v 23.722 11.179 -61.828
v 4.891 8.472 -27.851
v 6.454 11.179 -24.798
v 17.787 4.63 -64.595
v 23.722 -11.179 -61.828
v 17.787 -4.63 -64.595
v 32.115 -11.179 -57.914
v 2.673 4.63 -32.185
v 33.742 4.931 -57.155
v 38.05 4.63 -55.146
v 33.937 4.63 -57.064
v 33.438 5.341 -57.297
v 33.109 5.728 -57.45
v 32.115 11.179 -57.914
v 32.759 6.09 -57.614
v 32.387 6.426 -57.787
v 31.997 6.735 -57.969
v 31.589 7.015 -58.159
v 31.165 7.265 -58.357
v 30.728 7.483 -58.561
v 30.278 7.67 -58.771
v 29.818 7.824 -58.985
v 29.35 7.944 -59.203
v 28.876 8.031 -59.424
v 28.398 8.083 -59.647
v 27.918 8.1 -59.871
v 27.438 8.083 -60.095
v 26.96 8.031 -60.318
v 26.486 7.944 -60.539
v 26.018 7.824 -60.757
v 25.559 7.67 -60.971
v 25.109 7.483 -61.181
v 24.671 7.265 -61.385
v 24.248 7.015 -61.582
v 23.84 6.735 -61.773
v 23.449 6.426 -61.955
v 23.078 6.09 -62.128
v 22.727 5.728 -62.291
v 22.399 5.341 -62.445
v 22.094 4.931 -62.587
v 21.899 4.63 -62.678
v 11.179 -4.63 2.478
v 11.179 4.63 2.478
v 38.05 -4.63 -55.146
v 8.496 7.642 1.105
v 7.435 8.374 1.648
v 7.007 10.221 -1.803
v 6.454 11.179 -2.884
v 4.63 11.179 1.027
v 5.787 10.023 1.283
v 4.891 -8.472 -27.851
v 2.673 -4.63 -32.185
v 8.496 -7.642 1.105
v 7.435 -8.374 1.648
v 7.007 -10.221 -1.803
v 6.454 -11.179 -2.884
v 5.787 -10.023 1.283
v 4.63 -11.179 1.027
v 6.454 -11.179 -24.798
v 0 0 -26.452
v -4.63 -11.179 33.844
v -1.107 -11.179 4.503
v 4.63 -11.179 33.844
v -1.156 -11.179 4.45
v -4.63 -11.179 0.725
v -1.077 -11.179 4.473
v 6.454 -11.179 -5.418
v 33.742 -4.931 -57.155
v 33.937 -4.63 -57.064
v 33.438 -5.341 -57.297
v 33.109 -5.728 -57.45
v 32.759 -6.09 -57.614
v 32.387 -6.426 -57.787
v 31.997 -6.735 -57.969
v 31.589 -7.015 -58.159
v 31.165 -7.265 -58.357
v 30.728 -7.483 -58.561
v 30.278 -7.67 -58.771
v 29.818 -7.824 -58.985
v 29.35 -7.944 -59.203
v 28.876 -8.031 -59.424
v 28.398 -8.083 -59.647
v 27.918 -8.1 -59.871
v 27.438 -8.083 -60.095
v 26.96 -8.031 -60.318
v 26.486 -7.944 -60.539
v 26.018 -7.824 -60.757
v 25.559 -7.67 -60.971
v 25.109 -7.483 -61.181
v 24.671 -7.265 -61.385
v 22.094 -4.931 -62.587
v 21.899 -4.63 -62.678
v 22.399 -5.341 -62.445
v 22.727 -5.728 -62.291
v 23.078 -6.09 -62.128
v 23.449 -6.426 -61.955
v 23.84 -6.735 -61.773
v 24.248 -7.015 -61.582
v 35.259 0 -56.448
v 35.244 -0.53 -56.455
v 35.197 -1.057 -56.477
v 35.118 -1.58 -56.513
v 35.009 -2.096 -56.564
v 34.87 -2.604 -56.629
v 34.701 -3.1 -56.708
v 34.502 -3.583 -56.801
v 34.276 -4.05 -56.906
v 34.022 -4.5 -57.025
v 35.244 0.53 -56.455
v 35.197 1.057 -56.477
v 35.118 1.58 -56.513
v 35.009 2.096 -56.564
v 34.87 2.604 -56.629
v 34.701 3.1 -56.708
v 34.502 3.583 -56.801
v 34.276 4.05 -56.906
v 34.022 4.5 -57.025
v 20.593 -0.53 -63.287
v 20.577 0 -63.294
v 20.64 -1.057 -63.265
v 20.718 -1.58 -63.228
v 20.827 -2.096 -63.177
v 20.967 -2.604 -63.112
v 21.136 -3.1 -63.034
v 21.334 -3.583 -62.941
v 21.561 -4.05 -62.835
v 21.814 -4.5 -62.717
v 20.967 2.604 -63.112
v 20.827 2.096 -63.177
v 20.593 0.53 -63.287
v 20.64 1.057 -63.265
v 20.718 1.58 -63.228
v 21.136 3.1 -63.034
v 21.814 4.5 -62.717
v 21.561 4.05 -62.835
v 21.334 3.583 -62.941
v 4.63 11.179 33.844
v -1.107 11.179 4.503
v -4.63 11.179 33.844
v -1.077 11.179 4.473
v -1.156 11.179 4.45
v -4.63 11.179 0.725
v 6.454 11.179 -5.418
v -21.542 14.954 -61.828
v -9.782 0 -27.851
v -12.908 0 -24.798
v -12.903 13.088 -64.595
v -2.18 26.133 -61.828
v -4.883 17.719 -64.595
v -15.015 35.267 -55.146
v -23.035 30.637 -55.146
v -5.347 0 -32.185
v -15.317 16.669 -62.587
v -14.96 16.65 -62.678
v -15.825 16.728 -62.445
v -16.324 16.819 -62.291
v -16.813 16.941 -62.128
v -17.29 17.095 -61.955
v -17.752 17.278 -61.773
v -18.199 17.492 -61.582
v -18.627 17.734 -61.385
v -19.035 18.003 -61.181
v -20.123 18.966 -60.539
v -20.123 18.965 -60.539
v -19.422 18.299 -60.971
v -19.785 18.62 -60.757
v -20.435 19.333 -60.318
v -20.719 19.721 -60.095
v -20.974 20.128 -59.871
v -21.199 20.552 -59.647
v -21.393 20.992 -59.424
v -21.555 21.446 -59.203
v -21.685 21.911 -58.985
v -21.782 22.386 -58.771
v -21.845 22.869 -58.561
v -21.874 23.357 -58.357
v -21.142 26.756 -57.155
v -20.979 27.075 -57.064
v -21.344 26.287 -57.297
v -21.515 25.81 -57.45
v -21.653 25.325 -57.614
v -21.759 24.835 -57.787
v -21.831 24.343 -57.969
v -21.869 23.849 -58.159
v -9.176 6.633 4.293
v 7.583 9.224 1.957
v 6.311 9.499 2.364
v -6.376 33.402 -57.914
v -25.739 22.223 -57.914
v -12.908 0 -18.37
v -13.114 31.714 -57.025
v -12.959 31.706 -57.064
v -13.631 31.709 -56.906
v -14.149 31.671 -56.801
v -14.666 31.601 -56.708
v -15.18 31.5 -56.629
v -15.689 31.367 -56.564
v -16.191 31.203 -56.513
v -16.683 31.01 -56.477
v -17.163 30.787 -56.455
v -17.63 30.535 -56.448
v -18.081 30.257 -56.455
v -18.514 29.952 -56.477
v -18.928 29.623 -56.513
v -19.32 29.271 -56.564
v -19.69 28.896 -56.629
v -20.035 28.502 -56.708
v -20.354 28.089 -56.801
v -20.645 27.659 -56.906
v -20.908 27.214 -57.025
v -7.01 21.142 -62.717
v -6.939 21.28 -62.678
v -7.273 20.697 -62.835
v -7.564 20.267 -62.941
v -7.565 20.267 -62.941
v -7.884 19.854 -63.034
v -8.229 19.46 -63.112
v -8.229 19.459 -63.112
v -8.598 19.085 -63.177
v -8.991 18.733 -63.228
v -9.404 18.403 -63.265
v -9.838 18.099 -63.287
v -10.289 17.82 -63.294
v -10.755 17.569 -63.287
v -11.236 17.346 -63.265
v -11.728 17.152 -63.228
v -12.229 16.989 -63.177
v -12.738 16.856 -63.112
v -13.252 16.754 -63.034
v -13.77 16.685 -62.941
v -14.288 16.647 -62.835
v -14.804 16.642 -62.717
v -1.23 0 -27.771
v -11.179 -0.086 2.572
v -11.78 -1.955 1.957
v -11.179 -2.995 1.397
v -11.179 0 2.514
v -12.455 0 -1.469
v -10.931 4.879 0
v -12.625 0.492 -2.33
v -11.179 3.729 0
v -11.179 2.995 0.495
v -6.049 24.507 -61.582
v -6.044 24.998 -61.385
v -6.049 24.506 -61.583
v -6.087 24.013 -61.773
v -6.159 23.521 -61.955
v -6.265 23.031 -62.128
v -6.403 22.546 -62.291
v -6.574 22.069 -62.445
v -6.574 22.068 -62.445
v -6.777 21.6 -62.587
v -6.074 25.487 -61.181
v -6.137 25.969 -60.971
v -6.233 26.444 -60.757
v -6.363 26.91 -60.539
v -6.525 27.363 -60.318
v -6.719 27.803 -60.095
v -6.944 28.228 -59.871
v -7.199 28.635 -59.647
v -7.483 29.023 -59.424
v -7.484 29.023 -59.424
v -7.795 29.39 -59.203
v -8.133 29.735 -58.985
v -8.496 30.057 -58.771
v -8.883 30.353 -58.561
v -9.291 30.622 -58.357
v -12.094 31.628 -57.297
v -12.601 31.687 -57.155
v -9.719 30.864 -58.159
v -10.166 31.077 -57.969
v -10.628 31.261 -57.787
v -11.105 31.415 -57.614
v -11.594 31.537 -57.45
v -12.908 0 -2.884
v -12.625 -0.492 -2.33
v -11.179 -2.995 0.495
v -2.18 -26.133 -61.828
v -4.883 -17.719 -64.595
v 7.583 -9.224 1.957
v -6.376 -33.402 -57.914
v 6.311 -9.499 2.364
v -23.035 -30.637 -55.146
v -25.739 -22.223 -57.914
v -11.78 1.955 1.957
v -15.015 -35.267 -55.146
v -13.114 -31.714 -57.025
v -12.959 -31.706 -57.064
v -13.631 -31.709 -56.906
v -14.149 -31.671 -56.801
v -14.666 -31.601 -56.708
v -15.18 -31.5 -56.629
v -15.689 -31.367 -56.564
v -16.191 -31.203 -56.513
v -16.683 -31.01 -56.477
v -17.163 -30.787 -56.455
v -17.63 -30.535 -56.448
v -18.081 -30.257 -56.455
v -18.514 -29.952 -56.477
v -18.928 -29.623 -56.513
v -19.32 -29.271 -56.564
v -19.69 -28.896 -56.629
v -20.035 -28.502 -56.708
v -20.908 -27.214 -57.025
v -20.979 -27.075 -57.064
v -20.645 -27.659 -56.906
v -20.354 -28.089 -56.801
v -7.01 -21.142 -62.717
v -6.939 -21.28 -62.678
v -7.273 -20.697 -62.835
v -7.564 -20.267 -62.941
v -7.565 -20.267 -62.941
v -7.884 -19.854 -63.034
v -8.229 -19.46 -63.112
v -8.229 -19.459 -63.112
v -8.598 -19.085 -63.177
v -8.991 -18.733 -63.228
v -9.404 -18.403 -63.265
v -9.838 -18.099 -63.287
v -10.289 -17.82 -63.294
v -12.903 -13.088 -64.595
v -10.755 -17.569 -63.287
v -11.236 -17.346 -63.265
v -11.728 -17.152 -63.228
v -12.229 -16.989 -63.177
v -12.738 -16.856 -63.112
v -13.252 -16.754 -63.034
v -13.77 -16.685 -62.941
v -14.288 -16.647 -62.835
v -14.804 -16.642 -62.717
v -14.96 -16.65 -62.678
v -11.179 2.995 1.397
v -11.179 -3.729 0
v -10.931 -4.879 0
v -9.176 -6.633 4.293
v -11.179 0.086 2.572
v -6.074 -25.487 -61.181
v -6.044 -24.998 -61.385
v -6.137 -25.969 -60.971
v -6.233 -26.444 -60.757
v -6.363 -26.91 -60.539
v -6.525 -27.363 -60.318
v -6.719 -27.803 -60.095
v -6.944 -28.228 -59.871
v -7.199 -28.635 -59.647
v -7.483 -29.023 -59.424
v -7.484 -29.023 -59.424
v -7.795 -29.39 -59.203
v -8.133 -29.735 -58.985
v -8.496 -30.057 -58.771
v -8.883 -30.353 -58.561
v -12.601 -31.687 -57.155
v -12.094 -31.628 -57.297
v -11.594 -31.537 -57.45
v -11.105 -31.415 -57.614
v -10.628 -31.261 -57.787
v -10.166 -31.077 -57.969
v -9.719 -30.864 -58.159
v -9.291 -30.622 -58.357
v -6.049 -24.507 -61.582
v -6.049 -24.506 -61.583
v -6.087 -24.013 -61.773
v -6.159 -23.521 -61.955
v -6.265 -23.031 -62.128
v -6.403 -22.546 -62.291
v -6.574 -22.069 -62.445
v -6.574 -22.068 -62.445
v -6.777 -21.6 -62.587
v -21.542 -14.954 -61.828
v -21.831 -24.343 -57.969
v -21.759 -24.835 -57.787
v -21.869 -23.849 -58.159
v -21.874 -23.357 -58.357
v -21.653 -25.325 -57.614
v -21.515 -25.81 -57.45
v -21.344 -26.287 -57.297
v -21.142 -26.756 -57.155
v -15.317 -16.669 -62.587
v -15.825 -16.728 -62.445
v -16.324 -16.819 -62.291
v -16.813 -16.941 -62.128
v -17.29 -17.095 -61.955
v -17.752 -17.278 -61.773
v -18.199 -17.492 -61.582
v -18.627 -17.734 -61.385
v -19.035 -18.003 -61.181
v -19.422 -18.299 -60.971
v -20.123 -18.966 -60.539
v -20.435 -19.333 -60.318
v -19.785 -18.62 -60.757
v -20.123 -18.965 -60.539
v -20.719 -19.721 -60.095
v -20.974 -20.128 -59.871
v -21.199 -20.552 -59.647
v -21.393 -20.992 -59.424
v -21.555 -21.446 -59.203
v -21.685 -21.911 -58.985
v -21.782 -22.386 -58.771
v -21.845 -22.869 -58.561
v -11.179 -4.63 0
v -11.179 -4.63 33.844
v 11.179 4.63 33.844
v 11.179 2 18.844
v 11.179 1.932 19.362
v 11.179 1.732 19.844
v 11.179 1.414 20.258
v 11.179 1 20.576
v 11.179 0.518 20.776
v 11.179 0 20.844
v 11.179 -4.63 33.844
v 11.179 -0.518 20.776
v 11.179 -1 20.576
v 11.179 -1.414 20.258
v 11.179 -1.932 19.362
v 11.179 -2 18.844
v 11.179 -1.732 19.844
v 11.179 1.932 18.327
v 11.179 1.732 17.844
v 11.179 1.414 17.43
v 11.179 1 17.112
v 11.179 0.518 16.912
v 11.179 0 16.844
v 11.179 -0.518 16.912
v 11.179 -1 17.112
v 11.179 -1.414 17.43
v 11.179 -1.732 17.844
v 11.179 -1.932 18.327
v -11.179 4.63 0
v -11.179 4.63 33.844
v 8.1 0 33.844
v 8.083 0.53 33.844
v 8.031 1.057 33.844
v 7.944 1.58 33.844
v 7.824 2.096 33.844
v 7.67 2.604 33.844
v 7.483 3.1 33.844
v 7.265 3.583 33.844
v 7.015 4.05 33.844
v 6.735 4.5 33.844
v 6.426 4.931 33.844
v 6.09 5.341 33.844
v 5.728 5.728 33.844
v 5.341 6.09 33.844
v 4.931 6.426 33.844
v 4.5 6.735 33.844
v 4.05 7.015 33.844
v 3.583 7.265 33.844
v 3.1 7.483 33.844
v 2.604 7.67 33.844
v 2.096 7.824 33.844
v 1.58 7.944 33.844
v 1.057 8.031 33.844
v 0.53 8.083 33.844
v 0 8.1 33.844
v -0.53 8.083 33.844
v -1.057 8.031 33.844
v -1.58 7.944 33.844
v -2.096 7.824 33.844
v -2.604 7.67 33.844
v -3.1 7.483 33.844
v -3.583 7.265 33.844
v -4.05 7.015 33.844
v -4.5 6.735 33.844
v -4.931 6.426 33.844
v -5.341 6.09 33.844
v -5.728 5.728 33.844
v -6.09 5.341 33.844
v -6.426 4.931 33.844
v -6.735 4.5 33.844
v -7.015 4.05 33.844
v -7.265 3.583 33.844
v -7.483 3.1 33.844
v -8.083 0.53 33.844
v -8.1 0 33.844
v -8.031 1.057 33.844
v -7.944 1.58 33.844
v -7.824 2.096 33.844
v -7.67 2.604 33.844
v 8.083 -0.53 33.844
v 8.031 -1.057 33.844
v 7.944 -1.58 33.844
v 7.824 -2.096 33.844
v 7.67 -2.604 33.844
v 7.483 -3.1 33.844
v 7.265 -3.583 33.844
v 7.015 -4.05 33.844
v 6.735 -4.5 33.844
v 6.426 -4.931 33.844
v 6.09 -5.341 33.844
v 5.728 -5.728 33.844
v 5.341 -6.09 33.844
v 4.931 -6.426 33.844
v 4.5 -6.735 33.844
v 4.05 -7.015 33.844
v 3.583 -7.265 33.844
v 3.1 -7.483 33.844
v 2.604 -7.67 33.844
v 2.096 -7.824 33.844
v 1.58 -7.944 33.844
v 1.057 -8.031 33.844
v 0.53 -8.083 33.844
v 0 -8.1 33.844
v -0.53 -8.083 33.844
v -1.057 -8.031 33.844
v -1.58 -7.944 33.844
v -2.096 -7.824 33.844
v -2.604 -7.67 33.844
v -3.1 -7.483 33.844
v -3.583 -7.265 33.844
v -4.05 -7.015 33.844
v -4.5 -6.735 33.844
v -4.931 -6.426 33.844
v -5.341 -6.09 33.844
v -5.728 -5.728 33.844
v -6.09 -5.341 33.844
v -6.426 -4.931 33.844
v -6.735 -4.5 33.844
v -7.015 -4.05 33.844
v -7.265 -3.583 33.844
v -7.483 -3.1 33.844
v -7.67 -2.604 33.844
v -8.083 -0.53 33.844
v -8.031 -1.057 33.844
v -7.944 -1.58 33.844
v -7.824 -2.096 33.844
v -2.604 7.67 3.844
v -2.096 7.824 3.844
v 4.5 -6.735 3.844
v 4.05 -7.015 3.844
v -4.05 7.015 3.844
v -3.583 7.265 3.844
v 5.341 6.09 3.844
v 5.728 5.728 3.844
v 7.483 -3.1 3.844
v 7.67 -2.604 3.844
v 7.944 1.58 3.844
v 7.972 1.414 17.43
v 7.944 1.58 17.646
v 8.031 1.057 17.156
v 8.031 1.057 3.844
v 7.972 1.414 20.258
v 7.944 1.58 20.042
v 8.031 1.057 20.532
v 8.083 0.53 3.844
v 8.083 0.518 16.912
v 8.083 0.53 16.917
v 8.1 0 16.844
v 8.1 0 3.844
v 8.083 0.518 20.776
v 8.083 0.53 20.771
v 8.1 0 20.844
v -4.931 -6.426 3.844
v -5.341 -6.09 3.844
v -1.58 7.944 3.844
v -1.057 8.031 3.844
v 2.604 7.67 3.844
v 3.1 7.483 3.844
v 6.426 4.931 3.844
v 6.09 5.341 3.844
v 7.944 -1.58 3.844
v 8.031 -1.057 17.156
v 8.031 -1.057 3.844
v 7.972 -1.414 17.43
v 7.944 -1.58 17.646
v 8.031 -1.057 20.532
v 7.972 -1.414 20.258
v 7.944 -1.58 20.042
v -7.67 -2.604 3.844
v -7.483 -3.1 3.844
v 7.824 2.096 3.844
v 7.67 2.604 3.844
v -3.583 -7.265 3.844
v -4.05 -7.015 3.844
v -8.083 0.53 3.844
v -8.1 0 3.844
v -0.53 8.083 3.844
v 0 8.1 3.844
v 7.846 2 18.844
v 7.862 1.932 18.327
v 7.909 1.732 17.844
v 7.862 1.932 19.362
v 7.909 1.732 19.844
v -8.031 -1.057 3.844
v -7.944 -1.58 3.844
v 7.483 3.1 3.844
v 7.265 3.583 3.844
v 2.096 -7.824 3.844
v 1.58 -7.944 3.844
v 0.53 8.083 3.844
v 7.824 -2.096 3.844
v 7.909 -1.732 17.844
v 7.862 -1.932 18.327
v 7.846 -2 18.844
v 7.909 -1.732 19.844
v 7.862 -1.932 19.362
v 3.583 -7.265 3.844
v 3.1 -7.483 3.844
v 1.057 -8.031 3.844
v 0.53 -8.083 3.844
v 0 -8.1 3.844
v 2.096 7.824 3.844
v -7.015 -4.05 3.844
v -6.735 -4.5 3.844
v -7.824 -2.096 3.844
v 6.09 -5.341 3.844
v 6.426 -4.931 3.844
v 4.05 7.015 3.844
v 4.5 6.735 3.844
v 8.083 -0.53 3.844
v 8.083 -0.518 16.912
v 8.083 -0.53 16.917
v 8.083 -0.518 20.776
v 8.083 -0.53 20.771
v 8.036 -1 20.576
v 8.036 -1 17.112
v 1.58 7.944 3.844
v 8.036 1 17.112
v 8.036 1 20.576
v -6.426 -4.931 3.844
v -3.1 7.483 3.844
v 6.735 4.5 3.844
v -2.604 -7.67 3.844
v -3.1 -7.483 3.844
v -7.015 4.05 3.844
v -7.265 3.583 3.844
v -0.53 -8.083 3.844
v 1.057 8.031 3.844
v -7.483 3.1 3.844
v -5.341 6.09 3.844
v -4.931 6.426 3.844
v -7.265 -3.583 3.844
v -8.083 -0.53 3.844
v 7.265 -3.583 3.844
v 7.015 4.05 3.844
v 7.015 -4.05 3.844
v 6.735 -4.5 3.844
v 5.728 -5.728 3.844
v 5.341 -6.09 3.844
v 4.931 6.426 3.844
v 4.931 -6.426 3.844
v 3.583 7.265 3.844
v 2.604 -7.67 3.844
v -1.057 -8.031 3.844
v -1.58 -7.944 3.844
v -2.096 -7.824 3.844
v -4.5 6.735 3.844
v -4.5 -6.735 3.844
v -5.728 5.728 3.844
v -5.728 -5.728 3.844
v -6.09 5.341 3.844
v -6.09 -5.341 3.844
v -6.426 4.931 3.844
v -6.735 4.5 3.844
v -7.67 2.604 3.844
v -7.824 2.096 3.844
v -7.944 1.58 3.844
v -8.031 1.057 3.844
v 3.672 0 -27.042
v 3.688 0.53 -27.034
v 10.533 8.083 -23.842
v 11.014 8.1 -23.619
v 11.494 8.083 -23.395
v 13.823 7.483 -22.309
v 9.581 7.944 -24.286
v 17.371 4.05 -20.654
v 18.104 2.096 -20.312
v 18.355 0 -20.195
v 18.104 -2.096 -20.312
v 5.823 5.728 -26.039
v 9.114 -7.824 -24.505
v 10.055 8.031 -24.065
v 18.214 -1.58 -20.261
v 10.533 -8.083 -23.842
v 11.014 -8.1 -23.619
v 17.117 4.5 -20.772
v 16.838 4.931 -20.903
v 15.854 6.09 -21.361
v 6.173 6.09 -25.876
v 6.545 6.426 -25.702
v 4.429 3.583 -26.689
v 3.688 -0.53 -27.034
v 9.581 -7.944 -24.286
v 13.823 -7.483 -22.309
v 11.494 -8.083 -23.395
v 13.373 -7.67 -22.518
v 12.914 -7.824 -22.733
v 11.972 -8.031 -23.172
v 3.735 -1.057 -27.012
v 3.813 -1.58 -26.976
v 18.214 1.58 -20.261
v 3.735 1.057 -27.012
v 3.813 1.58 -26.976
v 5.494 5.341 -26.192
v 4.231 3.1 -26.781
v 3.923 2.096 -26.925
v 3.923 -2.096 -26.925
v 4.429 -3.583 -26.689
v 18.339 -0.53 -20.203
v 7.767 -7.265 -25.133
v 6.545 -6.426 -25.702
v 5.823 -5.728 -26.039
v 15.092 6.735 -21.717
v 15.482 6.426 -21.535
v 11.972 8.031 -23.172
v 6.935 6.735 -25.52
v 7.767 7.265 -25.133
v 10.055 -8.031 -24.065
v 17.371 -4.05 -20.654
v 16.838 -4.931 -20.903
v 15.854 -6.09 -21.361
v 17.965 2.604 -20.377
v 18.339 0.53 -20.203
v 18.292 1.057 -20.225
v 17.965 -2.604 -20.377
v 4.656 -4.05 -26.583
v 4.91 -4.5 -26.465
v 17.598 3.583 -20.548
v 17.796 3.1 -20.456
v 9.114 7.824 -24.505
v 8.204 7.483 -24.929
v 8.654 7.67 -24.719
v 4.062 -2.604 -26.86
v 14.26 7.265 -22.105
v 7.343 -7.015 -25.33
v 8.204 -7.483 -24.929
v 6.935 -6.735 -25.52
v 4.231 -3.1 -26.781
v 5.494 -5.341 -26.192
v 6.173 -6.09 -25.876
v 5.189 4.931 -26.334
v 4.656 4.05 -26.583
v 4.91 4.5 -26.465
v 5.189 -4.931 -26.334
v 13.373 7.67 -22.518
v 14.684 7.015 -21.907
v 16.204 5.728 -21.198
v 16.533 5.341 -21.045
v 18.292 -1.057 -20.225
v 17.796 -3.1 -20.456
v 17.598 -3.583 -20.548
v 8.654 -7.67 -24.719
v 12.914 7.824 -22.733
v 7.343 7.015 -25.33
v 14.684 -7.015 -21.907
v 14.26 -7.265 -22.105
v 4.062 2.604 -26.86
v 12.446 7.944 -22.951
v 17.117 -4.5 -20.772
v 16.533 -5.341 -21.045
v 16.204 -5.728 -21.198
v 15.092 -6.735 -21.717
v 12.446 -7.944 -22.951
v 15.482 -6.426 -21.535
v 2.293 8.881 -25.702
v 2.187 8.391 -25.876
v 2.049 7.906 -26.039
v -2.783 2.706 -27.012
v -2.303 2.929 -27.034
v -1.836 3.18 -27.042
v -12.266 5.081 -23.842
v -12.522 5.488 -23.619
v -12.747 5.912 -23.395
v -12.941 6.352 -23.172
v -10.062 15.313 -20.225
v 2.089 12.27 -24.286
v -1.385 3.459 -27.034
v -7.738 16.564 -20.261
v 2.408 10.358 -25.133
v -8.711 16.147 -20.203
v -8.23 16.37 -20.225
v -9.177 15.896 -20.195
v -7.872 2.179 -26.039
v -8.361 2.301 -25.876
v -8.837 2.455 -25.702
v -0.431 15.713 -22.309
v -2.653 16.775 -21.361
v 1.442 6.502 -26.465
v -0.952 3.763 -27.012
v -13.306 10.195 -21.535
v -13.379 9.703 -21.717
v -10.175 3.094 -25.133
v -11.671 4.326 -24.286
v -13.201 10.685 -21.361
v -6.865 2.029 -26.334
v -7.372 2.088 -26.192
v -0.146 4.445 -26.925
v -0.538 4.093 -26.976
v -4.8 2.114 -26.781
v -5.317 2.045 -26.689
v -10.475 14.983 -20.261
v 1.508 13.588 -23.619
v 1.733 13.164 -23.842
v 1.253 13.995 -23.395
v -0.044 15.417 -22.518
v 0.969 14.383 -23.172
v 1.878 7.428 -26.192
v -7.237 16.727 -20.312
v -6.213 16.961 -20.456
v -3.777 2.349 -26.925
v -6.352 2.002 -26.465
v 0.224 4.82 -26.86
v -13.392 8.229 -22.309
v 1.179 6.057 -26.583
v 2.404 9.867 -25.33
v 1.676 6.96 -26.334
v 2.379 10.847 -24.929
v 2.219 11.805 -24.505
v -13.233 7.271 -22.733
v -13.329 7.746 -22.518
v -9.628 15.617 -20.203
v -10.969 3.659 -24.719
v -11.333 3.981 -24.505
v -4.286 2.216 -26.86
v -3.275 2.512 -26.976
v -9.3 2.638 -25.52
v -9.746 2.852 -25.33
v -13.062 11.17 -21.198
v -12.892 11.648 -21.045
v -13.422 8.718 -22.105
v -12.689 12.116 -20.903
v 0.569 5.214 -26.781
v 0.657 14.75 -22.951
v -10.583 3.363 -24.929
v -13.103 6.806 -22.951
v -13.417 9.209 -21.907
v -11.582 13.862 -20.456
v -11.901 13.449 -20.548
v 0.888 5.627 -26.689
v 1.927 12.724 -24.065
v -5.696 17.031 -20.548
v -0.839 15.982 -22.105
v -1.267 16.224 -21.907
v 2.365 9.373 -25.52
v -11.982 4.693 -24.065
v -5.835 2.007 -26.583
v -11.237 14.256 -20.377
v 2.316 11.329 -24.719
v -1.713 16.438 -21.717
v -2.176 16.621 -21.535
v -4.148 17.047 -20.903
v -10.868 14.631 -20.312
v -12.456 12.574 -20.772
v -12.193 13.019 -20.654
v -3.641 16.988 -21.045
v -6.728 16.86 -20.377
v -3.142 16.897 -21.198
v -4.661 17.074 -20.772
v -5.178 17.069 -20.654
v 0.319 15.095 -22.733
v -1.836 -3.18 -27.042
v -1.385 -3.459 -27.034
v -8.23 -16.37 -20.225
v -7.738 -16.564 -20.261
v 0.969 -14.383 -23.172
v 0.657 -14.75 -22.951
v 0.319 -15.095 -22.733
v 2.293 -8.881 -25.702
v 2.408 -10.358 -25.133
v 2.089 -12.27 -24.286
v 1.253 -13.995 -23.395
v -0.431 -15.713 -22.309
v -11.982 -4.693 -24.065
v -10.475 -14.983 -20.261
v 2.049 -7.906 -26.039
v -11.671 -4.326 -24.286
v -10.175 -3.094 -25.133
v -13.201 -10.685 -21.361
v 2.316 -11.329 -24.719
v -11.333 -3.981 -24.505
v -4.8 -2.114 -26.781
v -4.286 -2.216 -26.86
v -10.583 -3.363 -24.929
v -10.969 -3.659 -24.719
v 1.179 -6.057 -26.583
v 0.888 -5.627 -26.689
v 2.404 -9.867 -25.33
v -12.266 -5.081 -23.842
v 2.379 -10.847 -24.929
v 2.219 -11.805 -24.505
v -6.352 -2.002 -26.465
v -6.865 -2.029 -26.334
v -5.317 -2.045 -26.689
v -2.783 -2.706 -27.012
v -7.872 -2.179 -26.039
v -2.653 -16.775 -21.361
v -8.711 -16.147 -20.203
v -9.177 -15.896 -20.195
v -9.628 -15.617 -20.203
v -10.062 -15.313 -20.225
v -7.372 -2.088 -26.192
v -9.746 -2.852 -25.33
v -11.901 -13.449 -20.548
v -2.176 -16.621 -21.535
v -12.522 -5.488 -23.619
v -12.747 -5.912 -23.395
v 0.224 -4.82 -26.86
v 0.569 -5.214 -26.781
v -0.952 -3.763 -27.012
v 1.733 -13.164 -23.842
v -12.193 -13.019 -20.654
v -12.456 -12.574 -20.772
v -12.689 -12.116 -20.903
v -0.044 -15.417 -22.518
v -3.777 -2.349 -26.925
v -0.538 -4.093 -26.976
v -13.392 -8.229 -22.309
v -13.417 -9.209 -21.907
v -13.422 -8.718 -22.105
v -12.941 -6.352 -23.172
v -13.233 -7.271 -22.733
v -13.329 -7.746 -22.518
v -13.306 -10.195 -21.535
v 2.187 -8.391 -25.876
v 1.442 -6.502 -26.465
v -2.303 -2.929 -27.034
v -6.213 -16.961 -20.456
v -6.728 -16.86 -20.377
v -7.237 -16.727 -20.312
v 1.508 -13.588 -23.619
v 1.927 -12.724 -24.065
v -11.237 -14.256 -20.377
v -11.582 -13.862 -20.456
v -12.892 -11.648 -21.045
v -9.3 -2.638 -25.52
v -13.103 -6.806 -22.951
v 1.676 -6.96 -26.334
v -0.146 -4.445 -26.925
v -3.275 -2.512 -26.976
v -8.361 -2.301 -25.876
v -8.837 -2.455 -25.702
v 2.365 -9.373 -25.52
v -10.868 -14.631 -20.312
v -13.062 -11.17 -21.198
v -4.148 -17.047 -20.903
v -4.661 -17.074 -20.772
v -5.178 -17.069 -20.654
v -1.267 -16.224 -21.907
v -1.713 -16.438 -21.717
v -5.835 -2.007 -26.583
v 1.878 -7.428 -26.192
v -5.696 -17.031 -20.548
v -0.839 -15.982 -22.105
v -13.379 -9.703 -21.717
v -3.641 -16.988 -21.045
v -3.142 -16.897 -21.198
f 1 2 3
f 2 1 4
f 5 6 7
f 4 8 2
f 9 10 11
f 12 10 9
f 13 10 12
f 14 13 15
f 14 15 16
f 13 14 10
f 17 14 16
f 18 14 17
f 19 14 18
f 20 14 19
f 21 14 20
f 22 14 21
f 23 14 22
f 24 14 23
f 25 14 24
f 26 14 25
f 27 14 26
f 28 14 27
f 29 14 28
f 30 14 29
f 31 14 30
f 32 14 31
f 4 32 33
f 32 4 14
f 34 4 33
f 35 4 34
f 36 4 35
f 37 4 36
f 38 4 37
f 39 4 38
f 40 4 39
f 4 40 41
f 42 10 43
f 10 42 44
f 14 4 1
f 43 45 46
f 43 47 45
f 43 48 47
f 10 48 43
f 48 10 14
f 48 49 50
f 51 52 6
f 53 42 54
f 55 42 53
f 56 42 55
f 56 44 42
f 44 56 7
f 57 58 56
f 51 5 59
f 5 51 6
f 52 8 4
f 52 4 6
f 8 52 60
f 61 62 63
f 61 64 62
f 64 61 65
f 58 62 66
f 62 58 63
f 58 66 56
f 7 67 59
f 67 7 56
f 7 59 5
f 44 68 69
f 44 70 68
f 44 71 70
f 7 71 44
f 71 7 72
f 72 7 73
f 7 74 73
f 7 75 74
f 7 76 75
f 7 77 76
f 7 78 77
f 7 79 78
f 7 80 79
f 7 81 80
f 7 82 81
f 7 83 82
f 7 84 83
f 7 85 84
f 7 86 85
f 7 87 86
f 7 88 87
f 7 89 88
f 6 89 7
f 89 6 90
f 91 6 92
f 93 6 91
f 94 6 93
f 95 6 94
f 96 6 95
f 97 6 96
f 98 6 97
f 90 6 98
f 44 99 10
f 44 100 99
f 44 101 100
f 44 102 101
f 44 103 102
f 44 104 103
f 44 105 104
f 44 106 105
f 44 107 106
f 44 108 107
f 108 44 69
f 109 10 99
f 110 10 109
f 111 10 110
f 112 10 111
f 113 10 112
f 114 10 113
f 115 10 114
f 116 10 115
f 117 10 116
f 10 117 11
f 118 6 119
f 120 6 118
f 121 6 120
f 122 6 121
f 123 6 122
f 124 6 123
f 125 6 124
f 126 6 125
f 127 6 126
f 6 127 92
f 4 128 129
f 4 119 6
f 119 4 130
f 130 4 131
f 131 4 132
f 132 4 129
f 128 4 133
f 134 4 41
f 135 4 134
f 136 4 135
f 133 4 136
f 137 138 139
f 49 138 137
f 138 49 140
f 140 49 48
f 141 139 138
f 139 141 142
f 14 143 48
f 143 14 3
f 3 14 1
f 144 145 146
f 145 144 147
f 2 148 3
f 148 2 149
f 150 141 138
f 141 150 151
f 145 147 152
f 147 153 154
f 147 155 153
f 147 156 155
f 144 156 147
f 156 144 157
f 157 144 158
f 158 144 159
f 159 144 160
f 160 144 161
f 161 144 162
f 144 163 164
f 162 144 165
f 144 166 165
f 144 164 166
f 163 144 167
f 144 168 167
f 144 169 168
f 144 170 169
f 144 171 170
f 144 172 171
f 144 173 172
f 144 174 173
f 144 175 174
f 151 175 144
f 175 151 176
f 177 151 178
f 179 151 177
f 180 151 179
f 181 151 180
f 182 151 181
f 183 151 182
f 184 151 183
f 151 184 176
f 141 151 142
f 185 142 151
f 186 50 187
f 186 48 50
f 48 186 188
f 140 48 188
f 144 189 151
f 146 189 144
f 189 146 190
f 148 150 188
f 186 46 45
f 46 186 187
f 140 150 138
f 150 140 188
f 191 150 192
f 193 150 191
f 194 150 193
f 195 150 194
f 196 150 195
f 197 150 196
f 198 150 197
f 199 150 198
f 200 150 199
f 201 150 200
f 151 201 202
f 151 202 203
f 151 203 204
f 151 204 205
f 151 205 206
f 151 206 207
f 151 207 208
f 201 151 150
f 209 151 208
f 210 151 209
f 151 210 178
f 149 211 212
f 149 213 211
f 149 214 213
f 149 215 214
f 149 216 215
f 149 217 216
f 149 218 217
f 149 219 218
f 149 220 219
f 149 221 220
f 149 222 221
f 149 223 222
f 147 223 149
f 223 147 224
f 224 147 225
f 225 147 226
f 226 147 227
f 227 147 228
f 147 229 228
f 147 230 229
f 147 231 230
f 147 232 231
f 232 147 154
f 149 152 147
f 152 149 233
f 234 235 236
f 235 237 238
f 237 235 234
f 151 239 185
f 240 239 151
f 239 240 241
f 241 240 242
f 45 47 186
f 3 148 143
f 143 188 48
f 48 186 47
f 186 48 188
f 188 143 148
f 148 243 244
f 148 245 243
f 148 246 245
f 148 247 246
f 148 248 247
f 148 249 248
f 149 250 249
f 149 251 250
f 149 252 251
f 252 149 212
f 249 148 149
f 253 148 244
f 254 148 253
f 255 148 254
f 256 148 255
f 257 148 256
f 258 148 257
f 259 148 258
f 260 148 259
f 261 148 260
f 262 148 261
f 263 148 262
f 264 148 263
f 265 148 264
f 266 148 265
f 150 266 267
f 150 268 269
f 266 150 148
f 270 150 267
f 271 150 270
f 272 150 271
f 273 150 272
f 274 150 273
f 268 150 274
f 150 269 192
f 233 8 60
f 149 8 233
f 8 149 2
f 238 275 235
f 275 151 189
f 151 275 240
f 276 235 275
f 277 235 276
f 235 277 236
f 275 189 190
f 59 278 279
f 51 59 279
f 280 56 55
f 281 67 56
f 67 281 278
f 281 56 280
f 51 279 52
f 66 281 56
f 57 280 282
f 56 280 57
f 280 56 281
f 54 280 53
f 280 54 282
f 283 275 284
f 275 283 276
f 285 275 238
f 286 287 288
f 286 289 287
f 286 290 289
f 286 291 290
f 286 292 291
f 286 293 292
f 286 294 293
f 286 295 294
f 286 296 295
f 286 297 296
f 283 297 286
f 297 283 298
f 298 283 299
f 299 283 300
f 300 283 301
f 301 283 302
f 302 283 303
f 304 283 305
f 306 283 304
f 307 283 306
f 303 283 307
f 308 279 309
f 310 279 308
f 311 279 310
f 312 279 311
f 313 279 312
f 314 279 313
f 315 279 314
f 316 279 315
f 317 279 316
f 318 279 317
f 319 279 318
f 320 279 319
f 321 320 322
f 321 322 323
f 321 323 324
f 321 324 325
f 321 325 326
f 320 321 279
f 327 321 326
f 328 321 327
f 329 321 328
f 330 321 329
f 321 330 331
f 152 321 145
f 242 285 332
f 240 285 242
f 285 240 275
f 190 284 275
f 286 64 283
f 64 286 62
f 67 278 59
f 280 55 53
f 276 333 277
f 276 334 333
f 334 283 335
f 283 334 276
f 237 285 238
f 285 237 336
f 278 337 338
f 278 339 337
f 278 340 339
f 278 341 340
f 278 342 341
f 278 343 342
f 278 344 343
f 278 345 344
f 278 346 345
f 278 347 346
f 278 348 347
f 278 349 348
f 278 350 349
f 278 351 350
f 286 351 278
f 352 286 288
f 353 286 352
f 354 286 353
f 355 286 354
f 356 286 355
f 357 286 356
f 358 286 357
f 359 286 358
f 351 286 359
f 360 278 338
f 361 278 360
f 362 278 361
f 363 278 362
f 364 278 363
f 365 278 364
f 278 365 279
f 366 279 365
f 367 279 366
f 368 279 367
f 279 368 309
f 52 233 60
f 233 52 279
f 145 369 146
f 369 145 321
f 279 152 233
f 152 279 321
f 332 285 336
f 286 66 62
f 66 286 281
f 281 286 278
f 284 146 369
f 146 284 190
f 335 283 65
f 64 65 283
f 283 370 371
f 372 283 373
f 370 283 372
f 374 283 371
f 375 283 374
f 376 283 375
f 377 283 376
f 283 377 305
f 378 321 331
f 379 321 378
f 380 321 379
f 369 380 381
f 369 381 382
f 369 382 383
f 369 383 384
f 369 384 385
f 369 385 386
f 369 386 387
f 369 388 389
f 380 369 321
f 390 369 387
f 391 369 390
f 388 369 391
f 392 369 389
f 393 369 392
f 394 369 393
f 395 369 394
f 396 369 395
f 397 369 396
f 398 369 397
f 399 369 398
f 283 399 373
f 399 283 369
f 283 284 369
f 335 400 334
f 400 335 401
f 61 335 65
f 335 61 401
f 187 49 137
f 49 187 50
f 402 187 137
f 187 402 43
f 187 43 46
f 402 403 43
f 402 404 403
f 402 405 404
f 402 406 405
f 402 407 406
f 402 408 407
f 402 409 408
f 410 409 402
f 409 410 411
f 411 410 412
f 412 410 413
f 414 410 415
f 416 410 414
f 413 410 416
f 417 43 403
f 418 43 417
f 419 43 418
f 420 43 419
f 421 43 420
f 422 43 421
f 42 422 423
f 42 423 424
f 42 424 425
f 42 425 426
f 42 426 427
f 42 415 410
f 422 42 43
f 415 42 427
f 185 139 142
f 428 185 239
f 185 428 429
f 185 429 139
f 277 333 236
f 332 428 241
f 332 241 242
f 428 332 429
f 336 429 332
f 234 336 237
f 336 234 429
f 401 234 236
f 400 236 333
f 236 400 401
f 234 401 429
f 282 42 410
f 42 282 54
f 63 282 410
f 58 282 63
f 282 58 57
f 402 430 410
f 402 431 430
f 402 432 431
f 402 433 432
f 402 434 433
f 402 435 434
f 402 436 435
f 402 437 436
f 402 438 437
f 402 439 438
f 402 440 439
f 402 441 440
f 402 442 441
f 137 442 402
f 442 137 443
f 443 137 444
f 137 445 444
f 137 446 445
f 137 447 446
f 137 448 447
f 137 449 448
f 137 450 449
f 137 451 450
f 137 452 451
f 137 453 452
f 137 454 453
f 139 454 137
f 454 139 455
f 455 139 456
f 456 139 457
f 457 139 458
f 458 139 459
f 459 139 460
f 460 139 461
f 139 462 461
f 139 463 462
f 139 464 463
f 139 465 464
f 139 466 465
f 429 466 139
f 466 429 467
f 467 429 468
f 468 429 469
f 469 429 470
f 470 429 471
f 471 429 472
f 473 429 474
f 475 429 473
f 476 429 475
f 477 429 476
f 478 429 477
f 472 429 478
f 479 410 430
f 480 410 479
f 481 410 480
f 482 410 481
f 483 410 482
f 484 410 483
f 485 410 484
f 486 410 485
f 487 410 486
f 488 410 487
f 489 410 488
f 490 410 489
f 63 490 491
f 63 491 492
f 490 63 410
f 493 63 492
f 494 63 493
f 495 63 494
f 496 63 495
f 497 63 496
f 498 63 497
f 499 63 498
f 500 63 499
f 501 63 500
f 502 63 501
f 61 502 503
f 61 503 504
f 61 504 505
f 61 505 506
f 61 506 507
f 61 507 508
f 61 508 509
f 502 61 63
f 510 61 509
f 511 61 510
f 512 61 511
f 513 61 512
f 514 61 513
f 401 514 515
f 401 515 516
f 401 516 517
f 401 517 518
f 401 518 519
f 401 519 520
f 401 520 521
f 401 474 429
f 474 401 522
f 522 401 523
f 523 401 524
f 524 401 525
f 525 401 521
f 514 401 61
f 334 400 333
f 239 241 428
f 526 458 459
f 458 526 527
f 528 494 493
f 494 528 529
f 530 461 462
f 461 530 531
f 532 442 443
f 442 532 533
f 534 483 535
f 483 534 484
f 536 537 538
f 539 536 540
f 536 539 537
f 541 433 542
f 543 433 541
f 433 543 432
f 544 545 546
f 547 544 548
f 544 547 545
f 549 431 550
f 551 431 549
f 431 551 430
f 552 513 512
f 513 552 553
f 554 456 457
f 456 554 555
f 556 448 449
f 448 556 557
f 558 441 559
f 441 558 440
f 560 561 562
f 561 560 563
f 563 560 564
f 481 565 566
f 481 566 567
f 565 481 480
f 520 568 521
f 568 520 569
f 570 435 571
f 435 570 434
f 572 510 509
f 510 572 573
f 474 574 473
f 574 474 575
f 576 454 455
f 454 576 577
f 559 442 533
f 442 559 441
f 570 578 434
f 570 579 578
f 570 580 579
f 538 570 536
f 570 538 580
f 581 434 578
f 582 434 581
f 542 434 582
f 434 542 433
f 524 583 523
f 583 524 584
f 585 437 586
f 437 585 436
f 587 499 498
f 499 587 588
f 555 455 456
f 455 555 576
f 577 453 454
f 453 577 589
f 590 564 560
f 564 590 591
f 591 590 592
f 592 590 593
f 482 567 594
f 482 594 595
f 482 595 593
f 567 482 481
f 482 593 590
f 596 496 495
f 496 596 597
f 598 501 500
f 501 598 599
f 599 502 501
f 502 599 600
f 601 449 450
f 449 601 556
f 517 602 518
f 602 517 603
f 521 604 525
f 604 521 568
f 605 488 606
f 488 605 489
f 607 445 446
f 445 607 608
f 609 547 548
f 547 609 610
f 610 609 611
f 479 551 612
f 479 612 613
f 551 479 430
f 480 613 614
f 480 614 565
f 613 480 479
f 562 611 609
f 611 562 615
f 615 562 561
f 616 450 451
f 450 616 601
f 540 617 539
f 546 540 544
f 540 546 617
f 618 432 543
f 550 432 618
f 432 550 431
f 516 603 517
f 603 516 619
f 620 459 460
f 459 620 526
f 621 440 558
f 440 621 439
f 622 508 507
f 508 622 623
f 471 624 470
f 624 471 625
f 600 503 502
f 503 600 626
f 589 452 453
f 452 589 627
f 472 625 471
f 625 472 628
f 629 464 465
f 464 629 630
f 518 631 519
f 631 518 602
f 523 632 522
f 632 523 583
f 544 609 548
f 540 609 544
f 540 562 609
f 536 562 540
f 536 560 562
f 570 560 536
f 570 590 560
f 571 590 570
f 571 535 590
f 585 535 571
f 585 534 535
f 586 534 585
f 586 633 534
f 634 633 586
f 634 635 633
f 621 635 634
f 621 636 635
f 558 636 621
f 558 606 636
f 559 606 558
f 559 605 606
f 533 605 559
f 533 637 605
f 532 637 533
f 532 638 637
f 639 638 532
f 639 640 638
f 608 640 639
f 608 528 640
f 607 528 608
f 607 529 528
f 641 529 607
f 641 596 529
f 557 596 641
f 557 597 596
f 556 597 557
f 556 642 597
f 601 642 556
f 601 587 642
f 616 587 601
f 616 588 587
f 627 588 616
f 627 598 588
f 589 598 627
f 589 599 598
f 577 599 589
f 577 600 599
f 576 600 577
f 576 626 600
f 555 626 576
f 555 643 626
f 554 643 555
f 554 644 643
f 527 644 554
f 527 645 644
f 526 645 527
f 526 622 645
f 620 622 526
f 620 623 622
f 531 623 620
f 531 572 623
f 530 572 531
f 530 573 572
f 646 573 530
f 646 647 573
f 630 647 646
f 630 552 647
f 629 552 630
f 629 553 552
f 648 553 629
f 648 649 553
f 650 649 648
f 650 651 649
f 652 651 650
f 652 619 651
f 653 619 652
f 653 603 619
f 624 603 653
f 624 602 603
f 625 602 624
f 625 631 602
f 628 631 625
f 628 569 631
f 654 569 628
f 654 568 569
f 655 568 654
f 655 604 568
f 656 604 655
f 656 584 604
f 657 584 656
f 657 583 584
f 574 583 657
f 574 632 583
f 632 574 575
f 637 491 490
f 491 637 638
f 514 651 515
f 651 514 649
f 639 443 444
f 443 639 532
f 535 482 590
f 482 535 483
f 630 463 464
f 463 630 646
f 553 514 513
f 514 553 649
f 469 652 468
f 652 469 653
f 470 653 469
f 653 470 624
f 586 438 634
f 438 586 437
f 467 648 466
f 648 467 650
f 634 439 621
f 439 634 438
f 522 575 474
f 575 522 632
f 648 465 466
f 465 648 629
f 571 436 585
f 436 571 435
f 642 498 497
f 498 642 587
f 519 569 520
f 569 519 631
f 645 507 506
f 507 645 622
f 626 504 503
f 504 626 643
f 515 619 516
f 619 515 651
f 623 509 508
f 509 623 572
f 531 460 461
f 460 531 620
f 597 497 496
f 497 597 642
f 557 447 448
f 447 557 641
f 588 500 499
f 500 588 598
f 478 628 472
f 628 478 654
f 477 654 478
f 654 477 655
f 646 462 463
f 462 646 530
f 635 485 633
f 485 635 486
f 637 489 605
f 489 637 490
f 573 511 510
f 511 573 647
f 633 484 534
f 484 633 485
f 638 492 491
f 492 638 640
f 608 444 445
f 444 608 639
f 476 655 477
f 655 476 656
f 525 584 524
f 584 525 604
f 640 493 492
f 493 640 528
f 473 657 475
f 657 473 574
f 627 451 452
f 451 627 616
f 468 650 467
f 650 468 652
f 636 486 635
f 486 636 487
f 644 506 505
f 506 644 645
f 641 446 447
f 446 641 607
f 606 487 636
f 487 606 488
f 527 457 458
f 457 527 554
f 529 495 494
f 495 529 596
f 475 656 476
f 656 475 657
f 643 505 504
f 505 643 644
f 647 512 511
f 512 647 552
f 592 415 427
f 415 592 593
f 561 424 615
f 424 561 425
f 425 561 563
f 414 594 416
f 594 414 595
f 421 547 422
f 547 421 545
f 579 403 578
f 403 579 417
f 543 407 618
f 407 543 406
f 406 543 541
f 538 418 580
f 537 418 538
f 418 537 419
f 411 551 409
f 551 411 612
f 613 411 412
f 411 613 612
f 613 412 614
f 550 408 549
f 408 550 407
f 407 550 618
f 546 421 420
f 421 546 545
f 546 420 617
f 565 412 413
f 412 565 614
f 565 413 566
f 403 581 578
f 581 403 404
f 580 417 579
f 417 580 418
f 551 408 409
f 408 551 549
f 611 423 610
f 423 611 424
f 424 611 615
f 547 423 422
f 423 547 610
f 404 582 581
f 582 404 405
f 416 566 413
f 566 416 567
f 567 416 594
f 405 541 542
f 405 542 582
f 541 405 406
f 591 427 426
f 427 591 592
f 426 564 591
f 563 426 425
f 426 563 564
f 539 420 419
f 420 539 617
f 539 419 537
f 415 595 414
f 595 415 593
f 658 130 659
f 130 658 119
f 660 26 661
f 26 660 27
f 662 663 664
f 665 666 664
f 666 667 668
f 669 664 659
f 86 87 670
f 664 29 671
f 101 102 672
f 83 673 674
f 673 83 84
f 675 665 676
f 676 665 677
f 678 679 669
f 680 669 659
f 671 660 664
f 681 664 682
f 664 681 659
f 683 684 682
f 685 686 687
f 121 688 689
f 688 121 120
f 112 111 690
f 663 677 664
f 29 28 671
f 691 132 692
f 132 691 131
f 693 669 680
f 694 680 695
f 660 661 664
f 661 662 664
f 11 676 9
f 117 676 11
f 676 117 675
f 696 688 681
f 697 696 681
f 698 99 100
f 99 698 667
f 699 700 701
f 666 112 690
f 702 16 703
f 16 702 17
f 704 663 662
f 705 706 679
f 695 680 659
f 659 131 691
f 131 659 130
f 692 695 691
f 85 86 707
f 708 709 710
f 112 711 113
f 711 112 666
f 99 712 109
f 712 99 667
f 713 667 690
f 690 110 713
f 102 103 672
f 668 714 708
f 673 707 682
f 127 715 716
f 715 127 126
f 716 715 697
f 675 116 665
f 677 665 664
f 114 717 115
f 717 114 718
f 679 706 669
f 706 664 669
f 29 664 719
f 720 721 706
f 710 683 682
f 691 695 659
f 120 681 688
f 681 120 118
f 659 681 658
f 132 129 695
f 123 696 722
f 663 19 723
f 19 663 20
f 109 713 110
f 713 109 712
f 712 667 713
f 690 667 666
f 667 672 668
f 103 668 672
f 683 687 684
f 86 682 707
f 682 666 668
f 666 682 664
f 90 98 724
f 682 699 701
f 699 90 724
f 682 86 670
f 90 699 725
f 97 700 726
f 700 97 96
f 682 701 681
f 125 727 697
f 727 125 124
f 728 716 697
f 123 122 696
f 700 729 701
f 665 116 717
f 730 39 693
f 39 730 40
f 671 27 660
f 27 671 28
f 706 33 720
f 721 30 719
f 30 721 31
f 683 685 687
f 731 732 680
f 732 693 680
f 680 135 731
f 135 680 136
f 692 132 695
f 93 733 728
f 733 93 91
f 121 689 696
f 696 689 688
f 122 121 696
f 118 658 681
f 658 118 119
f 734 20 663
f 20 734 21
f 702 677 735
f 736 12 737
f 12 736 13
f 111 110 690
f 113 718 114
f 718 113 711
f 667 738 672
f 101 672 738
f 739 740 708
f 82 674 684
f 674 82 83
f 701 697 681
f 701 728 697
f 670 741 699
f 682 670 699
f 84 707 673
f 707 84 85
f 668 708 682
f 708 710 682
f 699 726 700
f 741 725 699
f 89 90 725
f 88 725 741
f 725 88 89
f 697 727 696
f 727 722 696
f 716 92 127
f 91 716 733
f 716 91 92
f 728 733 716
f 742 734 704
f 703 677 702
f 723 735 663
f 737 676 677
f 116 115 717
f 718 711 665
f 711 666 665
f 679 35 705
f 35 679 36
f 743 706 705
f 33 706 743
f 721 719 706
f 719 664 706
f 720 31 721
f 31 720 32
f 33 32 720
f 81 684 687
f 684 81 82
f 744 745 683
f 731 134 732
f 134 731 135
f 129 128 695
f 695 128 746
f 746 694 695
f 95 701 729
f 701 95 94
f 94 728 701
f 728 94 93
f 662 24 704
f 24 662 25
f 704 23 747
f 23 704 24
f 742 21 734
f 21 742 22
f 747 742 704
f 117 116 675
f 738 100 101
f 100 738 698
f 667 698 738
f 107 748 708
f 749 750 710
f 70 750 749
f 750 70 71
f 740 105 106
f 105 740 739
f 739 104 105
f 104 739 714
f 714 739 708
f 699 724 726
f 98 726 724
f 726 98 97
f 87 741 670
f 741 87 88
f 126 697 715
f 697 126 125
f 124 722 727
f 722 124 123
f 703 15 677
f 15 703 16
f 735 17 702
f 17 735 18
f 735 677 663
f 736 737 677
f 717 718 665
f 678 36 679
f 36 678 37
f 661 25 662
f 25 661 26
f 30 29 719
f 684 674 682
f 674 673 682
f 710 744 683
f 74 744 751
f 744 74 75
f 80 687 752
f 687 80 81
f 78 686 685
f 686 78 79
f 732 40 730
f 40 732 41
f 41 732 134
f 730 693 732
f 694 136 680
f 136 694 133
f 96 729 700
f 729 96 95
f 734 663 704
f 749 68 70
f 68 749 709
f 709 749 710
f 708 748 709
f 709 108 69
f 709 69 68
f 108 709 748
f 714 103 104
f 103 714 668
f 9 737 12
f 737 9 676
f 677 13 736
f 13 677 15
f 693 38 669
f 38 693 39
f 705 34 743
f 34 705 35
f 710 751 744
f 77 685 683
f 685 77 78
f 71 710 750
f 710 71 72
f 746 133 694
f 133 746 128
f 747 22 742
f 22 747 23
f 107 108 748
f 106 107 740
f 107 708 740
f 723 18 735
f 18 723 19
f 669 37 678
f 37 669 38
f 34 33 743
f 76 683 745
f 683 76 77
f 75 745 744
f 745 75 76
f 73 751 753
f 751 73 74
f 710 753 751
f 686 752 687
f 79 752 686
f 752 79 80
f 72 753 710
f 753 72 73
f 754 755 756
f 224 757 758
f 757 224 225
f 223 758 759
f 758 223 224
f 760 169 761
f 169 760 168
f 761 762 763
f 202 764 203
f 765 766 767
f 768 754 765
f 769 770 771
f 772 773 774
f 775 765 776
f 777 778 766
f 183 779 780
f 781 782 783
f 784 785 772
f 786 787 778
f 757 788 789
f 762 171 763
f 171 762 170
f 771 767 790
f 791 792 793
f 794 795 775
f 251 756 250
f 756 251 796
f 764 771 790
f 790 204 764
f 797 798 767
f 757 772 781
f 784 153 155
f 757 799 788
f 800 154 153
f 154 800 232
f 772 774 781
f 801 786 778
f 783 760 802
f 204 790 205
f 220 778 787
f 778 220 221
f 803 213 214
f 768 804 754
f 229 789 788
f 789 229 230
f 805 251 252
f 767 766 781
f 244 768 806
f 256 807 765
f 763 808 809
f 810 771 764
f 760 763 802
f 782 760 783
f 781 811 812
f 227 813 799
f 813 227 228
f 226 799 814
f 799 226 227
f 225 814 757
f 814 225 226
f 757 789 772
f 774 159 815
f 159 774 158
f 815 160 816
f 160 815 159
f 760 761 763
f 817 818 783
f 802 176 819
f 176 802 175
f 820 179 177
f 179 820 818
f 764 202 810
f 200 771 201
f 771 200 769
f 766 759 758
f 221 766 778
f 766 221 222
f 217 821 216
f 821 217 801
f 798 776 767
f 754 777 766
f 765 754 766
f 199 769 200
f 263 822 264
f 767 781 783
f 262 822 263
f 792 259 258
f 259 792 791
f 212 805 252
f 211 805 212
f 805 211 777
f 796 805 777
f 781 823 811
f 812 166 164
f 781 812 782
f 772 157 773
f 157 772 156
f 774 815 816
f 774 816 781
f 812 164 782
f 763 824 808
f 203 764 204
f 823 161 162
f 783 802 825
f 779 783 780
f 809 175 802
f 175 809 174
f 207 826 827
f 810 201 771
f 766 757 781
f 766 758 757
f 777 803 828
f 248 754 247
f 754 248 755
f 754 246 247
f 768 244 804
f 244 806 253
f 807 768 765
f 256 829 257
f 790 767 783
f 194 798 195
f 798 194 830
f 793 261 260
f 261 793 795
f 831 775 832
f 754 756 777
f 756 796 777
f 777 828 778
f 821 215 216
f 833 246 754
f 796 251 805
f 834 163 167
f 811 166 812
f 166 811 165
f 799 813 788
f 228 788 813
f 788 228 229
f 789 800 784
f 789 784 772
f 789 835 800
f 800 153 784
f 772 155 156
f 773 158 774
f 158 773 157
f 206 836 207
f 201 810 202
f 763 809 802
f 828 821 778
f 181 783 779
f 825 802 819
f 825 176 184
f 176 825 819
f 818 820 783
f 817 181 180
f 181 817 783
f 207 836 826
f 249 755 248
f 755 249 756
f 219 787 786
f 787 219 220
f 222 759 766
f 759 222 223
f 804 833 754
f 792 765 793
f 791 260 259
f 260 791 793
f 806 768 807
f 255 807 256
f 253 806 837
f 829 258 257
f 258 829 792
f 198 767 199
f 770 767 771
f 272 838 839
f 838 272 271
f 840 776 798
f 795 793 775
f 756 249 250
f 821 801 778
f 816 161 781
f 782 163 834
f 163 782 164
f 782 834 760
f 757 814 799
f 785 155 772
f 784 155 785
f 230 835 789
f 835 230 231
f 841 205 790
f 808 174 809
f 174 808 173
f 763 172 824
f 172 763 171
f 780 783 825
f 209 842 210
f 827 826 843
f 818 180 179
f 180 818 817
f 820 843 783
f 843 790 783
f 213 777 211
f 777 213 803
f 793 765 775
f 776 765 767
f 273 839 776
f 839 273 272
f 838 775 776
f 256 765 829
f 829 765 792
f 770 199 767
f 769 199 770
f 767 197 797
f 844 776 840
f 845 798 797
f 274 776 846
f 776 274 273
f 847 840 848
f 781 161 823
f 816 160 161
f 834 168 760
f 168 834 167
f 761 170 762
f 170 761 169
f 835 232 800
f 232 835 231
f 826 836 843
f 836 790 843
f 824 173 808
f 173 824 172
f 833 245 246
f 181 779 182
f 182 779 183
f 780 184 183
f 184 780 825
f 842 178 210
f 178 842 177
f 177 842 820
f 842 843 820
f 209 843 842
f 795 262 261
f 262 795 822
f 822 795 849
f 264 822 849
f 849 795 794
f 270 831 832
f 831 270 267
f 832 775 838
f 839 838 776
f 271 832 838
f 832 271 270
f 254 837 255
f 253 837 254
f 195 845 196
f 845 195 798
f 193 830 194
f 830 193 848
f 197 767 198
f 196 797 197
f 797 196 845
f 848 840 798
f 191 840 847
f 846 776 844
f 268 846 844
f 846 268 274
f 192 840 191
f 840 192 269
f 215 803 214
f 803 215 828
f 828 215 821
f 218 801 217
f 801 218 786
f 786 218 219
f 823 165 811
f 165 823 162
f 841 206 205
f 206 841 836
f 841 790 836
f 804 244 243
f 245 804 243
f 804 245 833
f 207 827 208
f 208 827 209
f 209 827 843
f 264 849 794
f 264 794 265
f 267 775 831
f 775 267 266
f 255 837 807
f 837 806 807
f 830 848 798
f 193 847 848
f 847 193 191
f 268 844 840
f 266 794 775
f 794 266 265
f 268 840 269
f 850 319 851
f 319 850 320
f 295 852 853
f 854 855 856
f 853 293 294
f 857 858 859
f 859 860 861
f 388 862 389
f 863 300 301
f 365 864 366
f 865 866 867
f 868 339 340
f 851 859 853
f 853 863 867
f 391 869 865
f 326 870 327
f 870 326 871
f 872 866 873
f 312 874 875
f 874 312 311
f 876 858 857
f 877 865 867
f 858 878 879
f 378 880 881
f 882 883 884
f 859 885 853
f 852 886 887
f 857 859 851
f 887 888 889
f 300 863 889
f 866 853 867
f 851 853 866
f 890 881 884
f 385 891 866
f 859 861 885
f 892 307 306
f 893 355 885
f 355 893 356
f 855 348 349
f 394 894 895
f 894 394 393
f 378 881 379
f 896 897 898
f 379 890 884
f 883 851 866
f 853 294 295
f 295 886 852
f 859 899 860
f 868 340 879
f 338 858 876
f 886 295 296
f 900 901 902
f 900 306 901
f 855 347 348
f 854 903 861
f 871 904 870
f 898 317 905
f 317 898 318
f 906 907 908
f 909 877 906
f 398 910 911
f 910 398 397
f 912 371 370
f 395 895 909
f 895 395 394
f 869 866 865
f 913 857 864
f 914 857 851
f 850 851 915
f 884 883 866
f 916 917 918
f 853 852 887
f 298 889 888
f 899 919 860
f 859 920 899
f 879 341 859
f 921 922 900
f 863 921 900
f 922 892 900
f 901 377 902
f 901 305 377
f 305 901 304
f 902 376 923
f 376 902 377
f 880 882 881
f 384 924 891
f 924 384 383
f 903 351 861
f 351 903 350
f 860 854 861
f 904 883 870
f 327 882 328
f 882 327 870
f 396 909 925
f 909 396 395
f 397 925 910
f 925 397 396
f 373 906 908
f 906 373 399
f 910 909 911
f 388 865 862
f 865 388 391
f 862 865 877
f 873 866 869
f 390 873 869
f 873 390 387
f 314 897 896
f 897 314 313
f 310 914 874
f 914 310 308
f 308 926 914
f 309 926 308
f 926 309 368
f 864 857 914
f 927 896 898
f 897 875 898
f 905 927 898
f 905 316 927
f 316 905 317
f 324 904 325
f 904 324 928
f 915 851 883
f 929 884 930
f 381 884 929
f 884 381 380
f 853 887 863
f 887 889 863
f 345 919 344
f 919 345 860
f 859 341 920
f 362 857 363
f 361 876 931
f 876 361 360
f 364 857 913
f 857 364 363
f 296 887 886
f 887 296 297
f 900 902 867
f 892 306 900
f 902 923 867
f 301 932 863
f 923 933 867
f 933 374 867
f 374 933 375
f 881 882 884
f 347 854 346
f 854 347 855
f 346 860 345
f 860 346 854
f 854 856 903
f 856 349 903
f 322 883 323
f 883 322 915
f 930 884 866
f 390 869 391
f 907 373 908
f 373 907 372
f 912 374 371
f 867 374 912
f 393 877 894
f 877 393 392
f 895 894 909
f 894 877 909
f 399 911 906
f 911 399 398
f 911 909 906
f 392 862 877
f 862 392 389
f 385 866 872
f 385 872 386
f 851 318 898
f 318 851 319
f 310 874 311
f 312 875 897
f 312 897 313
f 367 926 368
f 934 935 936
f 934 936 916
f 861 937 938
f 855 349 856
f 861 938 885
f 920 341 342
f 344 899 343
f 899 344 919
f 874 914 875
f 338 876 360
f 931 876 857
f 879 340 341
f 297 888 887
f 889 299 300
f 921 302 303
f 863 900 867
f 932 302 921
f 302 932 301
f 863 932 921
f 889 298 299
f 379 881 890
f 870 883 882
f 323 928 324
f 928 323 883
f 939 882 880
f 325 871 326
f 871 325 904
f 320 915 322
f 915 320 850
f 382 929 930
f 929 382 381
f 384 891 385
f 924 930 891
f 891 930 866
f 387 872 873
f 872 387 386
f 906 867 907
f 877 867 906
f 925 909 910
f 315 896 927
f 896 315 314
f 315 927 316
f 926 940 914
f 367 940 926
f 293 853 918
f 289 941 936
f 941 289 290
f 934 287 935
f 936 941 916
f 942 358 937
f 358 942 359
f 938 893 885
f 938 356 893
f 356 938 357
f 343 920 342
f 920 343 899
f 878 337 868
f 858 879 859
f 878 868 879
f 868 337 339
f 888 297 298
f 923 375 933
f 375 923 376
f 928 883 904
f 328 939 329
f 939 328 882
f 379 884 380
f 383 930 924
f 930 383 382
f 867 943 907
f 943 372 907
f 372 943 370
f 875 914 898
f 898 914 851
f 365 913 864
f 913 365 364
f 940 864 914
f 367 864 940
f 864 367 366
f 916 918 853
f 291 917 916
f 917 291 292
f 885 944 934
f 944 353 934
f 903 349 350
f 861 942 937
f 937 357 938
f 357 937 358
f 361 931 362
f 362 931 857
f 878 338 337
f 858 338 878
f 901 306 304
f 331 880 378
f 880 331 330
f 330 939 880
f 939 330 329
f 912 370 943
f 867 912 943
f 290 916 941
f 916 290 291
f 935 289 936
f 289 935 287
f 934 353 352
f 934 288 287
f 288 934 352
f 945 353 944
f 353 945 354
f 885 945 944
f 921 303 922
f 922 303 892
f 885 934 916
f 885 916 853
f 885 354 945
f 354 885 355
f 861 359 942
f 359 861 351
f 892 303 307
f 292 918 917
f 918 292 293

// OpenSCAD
// A tripod head: three legs spread 120 degrees apart, each 25 degrees out
// from straight down, and a post straight up. Directions by angle with
// dir_spherical(theta, phi): theta from +Z, phi around from +X.
use <../rod_connectors.scad>

$fn = $preview ? 32 : 96;

splay = 25;
rod_connector([
  for (phi = [0, 120, 240]) rod(dir_spherical(180 - splay, phi), diameter=16, depth=40, wall=4),
  rod(dir_spherical(0, 0), diameter=16, depth=30, wall=4, screw=4),
]);
